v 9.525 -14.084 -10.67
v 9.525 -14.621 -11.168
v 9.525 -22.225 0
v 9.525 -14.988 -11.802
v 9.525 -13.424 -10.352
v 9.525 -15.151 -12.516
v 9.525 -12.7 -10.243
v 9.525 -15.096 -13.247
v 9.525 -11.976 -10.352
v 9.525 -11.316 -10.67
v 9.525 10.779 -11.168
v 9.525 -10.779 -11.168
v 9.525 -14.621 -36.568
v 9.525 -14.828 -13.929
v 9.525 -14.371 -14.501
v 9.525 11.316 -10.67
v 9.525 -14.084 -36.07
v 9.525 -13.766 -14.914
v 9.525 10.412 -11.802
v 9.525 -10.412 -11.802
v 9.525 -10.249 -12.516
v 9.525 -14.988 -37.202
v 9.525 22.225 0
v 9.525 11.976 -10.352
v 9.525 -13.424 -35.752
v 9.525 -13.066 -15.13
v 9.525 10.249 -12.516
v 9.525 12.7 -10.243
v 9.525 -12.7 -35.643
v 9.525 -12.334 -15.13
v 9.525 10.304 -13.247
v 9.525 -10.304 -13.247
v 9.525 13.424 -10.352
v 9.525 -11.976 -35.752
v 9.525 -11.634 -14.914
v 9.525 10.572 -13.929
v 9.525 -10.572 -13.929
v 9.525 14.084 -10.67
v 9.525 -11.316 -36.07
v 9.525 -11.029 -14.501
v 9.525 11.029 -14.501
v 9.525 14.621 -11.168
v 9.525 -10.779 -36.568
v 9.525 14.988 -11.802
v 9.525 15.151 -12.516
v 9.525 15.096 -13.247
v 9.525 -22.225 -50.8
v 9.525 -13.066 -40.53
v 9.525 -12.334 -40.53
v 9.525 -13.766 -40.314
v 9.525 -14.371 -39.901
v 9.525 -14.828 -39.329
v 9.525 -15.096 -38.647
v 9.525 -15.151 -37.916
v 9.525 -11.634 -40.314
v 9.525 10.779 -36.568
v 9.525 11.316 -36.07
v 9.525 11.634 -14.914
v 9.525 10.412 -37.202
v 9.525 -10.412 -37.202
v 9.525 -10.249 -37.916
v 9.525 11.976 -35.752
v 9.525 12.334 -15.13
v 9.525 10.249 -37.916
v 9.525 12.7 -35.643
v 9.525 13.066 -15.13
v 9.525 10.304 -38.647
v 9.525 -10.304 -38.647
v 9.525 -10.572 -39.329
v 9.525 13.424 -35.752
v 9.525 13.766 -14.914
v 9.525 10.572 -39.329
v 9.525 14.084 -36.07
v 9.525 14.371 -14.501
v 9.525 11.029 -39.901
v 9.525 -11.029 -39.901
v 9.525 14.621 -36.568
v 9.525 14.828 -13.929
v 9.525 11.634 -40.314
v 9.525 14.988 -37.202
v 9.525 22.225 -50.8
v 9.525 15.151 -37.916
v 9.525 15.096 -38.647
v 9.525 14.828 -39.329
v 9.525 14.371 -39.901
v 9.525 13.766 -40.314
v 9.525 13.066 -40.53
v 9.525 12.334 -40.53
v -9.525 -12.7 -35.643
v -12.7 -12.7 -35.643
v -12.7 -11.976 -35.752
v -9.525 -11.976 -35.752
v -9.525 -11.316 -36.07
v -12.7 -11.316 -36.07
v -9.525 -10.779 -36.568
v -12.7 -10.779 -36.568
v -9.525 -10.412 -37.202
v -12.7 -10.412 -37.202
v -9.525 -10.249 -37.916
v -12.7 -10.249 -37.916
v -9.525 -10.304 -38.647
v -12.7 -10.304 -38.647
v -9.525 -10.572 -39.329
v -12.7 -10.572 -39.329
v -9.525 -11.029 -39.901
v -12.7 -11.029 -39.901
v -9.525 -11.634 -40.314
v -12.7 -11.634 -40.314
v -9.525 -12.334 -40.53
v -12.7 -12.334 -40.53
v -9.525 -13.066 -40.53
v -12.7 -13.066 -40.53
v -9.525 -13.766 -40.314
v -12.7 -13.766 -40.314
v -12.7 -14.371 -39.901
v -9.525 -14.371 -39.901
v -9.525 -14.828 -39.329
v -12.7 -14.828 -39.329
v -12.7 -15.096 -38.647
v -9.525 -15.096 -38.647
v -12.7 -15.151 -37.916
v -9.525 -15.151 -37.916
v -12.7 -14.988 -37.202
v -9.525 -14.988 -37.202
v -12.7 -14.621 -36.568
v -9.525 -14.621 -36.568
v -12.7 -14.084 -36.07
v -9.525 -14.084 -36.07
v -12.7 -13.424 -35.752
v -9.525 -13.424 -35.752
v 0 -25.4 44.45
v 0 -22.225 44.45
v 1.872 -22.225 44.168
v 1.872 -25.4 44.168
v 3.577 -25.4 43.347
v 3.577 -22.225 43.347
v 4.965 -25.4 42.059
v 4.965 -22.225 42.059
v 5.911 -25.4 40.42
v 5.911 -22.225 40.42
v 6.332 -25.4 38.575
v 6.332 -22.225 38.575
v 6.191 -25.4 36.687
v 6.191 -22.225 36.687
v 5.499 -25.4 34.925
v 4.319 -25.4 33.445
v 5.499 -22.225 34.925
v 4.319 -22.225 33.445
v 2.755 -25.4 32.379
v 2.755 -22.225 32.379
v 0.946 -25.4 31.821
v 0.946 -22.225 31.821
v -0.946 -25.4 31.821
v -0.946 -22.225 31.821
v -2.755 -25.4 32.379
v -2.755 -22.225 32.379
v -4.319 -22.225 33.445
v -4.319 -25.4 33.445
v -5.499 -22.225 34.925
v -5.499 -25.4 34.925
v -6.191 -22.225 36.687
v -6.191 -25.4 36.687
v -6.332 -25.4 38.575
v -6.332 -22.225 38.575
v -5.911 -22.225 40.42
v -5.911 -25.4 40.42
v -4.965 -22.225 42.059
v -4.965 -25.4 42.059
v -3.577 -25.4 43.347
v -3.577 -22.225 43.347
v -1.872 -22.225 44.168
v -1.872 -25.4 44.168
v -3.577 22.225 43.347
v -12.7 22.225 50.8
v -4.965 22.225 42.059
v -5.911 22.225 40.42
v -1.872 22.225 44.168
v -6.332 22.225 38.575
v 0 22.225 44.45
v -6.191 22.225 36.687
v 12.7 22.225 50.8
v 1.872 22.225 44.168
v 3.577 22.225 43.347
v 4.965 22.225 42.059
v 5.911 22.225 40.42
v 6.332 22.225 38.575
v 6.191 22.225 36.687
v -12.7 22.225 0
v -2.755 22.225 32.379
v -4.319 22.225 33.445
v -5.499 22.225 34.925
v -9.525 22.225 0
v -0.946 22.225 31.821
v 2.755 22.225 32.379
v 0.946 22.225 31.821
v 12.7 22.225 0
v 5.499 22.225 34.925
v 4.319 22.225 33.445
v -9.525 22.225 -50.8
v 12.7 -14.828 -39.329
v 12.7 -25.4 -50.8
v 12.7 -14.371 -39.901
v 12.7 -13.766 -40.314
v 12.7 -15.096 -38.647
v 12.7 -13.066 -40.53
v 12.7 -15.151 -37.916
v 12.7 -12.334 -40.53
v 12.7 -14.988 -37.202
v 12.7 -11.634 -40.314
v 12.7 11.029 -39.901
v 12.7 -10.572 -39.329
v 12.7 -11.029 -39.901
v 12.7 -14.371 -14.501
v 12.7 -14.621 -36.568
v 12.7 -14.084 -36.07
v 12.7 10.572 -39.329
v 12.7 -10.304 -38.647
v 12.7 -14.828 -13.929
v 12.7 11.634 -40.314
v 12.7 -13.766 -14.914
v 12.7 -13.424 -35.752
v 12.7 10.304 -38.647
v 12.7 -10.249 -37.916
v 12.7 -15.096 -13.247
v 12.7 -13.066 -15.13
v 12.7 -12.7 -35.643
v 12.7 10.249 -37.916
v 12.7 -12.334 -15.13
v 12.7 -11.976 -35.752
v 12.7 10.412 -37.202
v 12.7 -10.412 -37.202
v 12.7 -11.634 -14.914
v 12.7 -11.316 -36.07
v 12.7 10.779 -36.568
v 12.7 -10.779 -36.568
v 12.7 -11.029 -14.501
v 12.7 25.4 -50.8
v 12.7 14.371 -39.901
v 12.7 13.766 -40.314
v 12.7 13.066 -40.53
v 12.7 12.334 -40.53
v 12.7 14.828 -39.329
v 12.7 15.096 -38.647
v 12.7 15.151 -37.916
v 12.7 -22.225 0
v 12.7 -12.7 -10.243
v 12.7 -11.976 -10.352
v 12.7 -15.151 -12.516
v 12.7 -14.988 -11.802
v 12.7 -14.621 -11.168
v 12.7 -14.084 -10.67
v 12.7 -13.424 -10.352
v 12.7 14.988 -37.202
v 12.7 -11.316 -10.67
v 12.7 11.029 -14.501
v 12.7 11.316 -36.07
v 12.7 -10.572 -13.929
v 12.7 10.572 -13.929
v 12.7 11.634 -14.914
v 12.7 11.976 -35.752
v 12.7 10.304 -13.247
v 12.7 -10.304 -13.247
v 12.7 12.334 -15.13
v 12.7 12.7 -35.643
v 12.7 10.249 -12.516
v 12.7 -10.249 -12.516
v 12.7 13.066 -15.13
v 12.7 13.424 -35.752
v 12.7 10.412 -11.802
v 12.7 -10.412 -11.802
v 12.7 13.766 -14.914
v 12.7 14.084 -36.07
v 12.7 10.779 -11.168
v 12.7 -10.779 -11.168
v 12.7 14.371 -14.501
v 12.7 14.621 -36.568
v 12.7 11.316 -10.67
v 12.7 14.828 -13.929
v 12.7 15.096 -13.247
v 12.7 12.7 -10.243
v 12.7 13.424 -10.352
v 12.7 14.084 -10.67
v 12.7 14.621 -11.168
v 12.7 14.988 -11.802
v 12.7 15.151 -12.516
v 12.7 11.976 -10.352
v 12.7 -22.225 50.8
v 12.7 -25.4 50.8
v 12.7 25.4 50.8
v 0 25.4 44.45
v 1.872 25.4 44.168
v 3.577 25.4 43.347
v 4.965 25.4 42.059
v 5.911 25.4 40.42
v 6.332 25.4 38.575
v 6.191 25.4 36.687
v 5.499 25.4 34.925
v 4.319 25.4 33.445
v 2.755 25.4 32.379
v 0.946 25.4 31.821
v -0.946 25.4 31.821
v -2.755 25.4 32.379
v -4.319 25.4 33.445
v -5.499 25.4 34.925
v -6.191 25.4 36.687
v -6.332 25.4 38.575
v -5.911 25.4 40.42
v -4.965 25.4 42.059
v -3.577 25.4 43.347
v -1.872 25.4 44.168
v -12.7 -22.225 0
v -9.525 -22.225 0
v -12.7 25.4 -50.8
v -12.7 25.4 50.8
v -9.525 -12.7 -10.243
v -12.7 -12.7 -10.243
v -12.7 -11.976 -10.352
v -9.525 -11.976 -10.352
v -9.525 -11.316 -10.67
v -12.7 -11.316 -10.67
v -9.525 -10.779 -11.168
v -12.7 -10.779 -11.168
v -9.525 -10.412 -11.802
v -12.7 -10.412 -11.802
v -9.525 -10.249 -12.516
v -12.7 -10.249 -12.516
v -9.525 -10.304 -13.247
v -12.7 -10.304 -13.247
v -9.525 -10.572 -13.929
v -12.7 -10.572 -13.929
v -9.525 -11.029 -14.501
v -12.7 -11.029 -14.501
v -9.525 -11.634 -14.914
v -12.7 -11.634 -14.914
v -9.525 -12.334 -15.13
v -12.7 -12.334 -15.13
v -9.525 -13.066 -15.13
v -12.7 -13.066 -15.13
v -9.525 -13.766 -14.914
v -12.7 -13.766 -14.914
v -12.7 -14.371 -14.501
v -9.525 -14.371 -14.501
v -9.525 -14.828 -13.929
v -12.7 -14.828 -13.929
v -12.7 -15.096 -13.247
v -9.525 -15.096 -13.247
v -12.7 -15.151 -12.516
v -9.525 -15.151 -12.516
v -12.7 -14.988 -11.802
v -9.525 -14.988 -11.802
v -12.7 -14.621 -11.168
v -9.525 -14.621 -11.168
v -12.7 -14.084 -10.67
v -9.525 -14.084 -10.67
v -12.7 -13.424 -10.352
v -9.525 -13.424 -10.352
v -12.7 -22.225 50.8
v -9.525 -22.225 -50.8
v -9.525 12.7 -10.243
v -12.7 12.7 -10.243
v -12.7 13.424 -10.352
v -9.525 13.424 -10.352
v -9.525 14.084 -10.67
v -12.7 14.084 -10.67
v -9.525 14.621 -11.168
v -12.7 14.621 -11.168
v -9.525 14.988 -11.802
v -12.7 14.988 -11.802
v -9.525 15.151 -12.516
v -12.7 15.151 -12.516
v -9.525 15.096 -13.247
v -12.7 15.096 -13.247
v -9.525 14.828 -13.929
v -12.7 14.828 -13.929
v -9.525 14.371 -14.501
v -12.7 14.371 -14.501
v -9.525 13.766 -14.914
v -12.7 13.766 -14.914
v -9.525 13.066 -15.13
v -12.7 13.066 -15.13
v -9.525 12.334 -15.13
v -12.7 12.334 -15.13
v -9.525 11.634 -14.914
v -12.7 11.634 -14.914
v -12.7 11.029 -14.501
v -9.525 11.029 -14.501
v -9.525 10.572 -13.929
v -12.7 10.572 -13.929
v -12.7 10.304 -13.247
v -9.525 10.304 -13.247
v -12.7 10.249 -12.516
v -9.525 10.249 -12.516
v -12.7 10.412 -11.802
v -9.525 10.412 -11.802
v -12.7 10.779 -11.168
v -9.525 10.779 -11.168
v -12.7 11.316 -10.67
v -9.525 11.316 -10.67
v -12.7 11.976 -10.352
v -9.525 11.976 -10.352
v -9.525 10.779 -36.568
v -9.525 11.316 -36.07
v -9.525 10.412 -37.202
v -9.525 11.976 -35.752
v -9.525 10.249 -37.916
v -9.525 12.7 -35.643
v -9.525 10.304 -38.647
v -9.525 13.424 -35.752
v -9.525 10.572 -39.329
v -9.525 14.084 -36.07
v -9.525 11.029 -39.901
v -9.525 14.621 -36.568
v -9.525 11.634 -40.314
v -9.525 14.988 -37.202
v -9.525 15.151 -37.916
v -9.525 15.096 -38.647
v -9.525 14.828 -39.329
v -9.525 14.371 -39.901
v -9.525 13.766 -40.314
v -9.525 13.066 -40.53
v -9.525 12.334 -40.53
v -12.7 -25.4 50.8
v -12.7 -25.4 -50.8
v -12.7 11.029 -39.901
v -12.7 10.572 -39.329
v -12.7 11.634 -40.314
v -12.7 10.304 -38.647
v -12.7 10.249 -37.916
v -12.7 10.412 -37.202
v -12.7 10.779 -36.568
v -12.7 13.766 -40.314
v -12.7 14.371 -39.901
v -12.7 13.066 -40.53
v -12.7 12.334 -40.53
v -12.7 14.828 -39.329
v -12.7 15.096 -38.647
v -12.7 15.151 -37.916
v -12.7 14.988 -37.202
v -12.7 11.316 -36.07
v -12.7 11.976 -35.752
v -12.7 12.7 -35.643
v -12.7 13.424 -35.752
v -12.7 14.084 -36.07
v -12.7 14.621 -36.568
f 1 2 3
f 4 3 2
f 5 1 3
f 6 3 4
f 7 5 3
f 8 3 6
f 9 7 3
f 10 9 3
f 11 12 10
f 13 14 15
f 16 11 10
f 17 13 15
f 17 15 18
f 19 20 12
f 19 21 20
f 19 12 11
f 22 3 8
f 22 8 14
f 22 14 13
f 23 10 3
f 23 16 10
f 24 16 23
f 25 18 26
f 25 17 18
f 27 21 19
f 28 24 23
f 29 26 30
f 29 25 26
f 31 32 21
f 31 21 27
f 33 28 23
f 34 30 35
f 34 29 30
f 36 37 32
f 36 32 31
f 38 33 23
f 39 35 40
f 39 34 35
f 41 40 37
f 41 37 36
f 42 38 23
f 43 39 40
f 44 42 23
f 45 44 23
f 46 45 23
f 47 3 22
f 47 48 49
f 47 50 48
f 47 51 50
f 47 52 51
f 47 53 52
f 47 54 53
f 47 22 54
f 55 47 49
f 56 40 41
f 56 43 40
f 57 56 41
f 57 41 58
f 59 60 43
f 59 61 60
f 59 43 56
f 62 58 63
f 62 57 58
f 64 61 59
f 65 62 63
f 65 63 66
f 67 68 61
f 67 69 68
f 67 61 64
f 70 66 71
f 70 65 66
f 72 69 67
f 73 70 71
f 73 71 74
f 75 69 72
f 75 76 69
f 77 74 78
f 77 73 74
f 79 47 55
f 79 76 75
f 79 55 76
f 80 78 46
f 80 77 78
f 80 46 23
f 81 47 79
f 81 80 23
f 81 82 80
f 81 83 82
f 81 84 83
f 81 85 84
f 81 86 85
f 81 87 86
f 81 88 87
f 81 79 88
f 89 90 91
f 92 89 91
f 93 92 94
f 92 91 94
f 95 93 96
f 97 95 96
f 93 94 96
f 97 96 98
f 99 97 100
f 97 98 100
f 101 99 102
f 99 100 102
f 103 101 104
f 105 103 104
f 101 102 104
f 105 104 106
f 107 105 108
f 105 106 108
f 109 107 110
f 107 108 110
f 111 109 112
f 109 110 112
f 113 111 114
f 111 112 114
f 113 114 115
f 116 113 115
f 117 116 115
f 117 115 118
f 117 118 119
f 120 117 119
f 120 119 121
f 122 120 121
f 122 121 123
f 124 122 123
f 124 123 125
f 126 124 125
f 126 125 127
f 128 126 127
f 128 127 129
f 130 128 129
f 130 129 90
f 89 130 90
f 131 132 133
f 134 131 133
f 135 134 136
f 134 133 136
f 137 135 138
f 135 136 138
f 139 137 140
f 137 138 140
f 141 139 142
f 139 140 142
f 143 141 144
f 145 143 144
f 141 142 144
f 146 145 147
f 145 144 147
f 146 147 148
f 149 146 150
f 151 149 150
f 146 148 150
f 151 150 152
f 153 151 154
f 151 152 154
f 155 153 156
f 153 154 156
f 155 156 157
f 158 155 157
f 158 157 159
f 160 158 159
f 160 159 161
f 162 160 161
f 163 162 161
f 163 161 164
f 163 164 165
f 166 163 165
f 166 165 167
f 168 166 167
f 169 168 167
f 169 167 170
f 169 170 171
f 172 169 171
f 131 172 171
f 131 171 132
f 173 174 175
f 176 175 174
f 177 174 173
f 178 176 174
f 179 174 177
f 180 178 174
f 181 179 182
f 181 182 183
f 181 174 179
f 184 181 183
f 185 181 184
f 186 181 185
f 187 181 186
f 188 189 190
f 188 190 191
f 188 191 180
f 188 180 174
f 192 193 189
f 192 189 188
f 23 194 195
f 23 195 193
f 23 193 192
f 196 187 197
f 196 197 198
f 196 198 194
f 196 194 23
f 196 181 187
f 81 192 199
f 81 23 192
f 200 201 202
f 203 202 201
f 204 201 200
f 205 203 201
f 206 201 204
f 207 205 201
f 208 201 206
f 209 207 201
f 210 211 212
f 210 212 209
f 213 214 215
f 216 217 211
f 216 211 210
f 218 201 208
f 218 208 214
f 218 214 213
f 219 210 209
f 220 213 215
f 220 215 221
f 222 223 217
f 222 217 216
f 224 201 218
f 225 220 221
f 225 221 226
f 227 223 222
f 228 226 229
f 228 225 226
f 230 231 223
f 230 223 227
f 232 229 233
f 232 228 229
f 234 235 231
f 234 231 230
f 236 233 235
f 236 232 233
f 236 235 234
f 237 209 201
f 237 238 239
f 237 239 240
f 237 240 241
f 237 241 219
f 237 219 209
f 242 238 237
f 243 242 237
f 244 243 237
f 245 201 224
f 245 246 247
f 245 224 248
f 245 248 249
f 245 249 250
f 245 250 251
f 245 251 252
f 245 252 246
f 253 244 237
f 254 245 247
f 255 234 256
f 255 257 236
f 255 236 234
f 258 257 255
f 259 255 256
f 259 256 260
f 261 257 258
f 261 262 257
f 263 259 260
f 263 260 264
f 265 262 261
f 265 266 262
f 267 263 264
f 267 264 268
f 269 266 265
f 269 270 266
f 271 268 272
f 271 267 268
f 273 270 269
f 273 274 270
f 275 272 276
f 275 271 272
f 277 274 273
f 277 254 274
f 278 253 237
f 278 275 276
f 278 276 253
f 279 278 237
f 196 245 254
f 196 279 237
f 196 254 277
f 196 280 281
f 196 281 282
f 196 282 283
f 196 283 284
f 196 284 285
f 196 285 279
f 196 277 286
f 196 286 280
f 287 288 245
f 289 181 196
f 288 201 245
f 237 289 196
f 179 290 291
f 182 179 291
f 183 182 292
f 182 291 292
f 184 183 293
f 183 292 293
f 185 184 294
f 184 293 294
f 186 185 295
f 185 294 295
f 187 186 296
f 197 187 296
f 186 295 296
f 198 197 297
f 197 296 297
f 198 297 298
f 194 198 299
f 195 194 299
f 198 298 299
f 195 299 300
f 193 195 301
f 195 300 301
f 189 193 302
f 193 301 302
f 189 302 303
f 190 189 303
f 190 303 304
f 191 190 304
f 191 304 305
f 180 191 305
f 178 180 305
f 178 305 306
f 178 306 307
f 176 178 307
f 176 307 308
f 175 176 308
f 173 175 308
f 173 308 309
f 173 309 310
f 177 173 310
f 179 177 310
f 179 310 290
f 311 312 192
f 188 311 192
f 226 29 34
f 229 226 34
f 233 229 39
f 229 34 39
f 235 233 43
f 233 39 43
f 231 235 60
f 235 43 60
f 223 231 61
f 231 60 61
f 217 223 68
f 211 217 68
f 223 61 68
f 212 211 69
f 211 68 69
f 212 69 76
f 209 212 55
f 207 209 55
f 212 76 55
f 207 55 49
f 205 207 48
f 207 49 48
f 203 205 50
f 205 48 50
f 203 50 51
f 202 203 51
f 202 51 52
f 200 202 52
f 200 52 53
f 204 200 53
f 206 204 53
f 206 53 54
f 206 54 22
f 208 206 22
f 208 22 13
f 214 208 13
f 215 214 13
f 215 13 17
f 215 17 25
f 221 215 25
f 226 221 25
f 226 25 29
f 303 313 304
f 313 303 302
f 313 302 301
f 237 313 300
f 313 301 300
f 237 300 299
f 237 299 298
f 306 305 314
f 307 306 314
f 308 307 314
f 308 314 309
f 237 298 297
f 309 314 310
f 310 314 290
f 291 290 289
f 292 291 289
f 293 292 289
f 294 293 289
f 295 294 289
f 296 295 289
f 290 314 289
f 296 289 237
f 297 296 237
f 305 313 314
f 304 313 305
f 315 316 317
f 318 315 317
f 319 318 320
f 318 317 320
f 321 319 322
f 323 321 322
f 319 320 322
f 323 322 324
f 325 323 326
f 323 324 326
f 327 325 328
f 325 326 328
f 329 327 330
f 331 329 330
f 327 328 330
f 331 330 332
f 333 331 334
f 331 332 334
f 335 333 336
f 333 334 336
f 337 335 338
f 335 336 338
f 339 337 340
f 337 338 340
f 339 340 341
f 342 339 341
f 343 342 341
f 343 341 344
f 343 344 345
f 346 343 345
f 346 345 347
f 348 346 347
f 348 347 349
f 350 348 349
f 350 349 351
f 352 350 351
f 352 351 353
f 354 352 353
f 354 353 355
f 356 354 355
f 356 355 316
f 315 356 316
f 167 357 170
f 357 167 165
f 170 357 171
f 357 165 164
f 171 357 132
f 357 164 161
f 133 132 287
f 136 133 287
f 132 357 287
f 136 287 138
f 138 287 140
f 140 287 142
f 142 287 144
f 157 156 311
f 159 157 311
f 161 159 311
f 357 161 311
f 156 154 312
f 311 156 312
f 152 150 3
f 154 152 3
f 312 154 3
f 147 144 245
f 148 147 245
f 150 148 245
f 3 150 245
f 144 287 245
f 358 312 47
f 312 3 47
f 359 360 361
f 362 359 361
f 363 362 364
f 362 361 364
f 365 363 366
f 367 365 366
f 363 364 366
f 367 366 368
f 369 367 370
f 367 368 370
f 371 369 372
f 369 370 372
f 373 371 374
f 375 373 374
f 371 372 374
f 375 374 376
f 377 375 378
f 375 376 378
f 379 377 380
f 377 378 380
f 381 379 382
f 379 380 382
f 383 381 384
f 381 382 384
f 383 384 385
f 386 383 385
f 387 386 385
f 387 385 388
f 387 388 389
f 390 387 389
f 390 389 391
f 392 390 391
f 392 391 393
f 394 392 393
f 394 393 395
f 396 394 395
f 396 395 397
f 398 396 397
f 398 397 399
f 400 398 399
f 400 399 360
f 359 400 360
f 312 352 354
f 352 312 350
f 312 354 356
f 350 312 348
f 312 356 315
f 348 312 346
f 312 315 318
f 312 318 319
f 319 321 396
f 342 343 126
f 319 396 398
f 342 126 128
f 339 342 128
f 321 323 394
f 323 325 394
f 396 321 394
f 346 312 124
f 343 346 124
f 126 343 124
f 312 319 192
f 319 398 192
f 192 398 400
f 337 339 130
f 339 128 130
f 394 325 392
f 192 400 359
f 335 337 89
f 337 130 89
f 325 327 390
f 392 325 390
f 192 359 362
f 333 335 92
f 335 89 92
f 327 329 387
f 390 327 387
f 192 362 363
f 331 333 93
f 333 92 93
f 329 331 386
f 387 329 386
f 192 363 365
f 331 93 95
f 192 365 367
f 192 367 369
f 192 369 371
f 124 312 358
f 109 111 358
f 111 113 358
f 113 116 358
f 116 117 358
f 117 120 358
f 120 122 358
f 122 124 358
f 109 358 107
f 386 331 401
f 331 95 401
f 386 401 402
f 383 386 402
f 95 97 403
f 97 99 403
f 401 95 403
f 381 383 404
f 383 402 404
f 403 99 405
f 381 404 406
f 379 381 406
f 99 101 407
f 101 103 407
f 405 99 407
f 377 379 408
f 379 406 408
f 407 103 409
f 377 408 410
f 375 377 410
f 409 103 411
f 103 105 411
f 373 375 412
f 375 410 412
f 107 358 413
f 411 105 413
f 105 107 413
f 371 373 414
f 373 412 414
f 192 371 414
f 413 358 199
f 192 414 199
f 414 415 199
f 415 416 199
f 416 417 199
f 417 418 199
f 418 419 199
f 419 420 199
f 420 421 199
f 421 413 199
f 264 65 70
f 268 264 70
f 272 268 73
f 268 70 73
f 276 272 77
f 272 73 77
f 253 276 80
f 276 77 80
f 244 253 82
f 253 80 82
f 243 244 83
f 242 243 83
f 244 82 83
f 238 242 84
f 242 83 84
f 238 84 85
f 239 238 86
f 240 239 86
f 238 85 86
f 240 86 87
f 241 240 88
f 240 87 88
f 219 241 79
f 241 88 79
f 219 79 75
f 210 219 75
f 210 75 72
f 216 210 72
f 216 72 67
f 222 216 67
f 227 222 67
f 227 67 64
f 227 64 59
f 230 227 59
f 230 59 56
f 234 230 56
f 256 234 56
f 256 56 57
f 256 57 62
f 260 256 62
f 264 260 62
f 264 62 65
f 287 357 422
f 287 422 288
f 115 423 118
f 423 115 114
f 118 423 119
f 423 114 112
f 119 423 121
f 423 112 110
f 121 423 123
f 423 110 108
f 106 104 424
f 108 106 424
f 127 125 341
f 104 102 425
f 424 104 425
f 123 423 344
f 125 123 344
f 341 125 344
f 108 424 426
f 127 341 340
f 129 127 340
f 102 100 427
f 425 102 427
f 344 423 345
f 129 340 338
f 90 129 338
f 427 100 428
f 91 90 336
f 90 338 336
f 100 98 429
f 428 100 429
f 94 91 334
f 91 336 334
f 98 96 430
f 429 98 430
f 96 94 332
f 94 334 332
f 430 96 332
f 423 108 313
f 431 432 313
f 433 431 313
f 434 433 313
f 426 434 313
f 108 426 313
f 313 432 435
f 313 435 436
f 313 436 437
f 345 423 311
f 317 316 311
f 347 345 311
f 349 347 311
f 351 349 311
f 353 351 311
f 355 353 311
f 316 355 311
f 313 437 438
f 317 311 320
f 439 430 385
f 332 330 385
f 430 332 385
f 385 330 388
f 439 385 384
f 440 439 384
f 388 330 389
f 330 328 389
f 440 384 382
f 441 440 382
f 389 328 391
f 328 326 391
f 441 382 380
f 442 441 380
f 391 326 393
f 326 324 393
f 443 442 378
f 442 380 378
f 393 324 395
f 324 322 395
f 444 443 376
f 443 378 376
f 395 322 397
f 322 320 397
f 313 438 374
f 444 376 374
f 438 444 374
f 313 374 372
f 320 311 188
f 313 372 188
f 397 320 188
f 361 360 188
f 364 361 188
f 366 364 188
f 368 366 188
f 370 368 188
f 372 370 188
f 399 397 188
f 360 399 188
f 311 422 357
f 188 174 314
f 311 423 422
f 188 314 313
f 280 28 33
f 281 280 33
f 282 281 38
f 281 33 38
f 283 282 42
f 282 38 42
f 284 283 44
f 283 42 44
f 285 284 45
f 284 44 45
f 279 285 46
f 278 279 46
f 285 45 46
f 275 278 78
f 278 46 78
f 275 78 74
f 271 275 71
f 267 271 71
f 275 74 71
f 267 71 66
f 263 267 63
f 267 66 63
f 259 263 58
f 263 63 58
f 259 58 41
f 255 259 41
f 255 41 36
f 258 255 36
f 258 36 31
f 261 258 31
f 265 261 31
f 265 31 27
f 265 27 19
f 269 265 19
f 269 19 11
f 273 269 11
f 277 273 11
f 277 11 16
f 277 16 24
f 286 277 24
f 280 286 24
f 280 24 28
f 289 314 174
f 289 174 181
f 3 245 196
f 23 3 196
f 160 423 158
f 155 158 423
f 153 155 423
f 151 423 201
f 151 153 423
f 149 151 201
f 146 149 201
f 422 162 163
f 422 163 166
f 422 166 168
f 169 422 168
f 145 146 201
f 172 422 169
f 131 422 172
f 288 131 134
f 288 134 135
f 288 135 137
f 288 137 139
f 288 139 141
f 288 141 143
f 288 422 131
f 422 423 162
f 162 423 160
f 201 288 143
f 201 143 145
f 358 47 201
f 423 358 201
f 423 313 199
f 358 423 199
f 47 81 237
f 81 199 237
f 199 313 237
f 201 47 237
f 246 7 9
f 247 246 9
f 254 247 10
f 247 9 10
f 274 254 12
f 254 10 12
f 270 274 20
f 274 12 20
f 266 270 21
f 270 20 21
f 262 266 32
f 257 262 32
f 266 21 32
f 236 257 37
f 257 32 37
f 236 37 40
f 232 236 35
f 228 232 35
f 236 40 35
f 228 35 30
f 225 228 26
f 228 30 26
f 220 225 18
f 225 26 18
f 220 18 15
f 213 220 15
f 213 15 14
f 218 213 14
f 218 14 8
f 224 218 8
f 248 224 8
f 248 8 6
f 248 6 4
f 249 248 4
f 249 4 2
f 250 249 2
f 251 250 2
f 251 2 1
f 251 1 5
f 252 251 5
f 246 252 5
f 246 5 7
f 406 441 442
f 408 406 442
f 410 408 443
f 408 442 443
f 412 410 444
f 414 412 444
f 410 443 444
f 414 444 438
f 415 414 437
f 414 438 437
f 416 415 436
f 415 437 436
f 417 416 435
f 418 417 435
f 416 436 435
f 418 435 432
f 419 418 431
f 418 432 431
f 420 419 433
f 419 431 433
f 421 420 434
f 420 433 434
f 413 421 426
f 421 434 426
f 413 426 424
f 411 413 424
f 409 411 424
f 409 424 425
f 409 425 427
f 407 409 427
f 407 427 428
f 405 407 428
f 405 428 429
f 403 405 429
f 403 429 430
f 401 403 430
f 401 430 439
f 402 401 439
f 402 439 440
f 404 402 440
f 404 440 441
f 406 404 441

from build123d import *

# Parameters (mm, degrees)
SKETCH2_W                    = 25.4
SKETCH2_H                    = 50.8
BOSS_EXTRUDE1_DEPTH          = 50.8
SKETCH3_W                    = 50.8
SKETCH3_H                    = 44.45
CUT_EXTRUDE1_DEPTH           = 63.217039467
SKETCH4_R                    = 6.35
CUT_EXTRUDE2_DEPTH           = 73.955945611
F_10_0_1935_DIAMETER_HOLE2_D = 4.9149
SKETCH9_W                    = 19.05
SKETCH9_H                    = 44.45
CUT_EXTRUDE3_DEPTH           = 106.494123059


with BuildPart() as part:
    # Sketch2 → Boss-Extrude1 (new, symmetric)
    with BuildSketch(Plane.XY):
        Rectangle(SKETCH2_W, SKETCH2_H)
    extrude(amount=BOSS_EXTRUDE1_DEPTH, both=True)

    # Sketch3 → Cut-Extrude1 (cut, through all)
    with BuildSketch(Plane(origin=(12.7, 0, 0), x_dir=(0, 0, -1), z_dir=(1, 0, 0))):
        with Locations((-25.4, 0)):
            Rectangle(SKETCH3_W, SKETCH3_H)
    extrude(amount=-CUT_EXTRUDE1_DEPTH, mode=Mode.SUBTRACT)

    # Sketch4 → Cut-Extrude2 (cut, through all)
    with BuildSketch(Plane(origin=(0, 25.4, 0), x_dir=(1, 0, 0), z_dir=(0, 1, 0))):
        with Locations(Location((0, -38.1, 0), (0, 0, 270))):
            Circle(SKETCH4_R)
    extrude(amount=-CUT_EXTRUDE2_DEPTH, mode=Mode.SUBTRACT)

    # #10 (0.1935) Diameter Hole2 (through all)
    with Locations(Plane(origin=(12.7, 0, 0), x_dir=(0, 0, -1), z_dir=(1, 0, 0))):
        with Locations((12.7, 12.7), (38.1, 12.7), (12.7, -12.7), (38.1, -12.7)):
            Hole(F_10_0_1935_DIAMETER_HOLE2_D / 2)

    # Sketch9 → Cut-Extrude3 (cut, through all)
    with BuildSketch(Plane(origin=(0, 0, -50.8), x_dir=(-1, 0, 0), z_dir=(0, 0, -1))):
        Rectangle(SKETCH9_W, SKETCH9_H)
    extrude(amount=-CUT_EXTRUDE3_DEPTH, mode=Mode.SUBTRACT)


solid = part.part
